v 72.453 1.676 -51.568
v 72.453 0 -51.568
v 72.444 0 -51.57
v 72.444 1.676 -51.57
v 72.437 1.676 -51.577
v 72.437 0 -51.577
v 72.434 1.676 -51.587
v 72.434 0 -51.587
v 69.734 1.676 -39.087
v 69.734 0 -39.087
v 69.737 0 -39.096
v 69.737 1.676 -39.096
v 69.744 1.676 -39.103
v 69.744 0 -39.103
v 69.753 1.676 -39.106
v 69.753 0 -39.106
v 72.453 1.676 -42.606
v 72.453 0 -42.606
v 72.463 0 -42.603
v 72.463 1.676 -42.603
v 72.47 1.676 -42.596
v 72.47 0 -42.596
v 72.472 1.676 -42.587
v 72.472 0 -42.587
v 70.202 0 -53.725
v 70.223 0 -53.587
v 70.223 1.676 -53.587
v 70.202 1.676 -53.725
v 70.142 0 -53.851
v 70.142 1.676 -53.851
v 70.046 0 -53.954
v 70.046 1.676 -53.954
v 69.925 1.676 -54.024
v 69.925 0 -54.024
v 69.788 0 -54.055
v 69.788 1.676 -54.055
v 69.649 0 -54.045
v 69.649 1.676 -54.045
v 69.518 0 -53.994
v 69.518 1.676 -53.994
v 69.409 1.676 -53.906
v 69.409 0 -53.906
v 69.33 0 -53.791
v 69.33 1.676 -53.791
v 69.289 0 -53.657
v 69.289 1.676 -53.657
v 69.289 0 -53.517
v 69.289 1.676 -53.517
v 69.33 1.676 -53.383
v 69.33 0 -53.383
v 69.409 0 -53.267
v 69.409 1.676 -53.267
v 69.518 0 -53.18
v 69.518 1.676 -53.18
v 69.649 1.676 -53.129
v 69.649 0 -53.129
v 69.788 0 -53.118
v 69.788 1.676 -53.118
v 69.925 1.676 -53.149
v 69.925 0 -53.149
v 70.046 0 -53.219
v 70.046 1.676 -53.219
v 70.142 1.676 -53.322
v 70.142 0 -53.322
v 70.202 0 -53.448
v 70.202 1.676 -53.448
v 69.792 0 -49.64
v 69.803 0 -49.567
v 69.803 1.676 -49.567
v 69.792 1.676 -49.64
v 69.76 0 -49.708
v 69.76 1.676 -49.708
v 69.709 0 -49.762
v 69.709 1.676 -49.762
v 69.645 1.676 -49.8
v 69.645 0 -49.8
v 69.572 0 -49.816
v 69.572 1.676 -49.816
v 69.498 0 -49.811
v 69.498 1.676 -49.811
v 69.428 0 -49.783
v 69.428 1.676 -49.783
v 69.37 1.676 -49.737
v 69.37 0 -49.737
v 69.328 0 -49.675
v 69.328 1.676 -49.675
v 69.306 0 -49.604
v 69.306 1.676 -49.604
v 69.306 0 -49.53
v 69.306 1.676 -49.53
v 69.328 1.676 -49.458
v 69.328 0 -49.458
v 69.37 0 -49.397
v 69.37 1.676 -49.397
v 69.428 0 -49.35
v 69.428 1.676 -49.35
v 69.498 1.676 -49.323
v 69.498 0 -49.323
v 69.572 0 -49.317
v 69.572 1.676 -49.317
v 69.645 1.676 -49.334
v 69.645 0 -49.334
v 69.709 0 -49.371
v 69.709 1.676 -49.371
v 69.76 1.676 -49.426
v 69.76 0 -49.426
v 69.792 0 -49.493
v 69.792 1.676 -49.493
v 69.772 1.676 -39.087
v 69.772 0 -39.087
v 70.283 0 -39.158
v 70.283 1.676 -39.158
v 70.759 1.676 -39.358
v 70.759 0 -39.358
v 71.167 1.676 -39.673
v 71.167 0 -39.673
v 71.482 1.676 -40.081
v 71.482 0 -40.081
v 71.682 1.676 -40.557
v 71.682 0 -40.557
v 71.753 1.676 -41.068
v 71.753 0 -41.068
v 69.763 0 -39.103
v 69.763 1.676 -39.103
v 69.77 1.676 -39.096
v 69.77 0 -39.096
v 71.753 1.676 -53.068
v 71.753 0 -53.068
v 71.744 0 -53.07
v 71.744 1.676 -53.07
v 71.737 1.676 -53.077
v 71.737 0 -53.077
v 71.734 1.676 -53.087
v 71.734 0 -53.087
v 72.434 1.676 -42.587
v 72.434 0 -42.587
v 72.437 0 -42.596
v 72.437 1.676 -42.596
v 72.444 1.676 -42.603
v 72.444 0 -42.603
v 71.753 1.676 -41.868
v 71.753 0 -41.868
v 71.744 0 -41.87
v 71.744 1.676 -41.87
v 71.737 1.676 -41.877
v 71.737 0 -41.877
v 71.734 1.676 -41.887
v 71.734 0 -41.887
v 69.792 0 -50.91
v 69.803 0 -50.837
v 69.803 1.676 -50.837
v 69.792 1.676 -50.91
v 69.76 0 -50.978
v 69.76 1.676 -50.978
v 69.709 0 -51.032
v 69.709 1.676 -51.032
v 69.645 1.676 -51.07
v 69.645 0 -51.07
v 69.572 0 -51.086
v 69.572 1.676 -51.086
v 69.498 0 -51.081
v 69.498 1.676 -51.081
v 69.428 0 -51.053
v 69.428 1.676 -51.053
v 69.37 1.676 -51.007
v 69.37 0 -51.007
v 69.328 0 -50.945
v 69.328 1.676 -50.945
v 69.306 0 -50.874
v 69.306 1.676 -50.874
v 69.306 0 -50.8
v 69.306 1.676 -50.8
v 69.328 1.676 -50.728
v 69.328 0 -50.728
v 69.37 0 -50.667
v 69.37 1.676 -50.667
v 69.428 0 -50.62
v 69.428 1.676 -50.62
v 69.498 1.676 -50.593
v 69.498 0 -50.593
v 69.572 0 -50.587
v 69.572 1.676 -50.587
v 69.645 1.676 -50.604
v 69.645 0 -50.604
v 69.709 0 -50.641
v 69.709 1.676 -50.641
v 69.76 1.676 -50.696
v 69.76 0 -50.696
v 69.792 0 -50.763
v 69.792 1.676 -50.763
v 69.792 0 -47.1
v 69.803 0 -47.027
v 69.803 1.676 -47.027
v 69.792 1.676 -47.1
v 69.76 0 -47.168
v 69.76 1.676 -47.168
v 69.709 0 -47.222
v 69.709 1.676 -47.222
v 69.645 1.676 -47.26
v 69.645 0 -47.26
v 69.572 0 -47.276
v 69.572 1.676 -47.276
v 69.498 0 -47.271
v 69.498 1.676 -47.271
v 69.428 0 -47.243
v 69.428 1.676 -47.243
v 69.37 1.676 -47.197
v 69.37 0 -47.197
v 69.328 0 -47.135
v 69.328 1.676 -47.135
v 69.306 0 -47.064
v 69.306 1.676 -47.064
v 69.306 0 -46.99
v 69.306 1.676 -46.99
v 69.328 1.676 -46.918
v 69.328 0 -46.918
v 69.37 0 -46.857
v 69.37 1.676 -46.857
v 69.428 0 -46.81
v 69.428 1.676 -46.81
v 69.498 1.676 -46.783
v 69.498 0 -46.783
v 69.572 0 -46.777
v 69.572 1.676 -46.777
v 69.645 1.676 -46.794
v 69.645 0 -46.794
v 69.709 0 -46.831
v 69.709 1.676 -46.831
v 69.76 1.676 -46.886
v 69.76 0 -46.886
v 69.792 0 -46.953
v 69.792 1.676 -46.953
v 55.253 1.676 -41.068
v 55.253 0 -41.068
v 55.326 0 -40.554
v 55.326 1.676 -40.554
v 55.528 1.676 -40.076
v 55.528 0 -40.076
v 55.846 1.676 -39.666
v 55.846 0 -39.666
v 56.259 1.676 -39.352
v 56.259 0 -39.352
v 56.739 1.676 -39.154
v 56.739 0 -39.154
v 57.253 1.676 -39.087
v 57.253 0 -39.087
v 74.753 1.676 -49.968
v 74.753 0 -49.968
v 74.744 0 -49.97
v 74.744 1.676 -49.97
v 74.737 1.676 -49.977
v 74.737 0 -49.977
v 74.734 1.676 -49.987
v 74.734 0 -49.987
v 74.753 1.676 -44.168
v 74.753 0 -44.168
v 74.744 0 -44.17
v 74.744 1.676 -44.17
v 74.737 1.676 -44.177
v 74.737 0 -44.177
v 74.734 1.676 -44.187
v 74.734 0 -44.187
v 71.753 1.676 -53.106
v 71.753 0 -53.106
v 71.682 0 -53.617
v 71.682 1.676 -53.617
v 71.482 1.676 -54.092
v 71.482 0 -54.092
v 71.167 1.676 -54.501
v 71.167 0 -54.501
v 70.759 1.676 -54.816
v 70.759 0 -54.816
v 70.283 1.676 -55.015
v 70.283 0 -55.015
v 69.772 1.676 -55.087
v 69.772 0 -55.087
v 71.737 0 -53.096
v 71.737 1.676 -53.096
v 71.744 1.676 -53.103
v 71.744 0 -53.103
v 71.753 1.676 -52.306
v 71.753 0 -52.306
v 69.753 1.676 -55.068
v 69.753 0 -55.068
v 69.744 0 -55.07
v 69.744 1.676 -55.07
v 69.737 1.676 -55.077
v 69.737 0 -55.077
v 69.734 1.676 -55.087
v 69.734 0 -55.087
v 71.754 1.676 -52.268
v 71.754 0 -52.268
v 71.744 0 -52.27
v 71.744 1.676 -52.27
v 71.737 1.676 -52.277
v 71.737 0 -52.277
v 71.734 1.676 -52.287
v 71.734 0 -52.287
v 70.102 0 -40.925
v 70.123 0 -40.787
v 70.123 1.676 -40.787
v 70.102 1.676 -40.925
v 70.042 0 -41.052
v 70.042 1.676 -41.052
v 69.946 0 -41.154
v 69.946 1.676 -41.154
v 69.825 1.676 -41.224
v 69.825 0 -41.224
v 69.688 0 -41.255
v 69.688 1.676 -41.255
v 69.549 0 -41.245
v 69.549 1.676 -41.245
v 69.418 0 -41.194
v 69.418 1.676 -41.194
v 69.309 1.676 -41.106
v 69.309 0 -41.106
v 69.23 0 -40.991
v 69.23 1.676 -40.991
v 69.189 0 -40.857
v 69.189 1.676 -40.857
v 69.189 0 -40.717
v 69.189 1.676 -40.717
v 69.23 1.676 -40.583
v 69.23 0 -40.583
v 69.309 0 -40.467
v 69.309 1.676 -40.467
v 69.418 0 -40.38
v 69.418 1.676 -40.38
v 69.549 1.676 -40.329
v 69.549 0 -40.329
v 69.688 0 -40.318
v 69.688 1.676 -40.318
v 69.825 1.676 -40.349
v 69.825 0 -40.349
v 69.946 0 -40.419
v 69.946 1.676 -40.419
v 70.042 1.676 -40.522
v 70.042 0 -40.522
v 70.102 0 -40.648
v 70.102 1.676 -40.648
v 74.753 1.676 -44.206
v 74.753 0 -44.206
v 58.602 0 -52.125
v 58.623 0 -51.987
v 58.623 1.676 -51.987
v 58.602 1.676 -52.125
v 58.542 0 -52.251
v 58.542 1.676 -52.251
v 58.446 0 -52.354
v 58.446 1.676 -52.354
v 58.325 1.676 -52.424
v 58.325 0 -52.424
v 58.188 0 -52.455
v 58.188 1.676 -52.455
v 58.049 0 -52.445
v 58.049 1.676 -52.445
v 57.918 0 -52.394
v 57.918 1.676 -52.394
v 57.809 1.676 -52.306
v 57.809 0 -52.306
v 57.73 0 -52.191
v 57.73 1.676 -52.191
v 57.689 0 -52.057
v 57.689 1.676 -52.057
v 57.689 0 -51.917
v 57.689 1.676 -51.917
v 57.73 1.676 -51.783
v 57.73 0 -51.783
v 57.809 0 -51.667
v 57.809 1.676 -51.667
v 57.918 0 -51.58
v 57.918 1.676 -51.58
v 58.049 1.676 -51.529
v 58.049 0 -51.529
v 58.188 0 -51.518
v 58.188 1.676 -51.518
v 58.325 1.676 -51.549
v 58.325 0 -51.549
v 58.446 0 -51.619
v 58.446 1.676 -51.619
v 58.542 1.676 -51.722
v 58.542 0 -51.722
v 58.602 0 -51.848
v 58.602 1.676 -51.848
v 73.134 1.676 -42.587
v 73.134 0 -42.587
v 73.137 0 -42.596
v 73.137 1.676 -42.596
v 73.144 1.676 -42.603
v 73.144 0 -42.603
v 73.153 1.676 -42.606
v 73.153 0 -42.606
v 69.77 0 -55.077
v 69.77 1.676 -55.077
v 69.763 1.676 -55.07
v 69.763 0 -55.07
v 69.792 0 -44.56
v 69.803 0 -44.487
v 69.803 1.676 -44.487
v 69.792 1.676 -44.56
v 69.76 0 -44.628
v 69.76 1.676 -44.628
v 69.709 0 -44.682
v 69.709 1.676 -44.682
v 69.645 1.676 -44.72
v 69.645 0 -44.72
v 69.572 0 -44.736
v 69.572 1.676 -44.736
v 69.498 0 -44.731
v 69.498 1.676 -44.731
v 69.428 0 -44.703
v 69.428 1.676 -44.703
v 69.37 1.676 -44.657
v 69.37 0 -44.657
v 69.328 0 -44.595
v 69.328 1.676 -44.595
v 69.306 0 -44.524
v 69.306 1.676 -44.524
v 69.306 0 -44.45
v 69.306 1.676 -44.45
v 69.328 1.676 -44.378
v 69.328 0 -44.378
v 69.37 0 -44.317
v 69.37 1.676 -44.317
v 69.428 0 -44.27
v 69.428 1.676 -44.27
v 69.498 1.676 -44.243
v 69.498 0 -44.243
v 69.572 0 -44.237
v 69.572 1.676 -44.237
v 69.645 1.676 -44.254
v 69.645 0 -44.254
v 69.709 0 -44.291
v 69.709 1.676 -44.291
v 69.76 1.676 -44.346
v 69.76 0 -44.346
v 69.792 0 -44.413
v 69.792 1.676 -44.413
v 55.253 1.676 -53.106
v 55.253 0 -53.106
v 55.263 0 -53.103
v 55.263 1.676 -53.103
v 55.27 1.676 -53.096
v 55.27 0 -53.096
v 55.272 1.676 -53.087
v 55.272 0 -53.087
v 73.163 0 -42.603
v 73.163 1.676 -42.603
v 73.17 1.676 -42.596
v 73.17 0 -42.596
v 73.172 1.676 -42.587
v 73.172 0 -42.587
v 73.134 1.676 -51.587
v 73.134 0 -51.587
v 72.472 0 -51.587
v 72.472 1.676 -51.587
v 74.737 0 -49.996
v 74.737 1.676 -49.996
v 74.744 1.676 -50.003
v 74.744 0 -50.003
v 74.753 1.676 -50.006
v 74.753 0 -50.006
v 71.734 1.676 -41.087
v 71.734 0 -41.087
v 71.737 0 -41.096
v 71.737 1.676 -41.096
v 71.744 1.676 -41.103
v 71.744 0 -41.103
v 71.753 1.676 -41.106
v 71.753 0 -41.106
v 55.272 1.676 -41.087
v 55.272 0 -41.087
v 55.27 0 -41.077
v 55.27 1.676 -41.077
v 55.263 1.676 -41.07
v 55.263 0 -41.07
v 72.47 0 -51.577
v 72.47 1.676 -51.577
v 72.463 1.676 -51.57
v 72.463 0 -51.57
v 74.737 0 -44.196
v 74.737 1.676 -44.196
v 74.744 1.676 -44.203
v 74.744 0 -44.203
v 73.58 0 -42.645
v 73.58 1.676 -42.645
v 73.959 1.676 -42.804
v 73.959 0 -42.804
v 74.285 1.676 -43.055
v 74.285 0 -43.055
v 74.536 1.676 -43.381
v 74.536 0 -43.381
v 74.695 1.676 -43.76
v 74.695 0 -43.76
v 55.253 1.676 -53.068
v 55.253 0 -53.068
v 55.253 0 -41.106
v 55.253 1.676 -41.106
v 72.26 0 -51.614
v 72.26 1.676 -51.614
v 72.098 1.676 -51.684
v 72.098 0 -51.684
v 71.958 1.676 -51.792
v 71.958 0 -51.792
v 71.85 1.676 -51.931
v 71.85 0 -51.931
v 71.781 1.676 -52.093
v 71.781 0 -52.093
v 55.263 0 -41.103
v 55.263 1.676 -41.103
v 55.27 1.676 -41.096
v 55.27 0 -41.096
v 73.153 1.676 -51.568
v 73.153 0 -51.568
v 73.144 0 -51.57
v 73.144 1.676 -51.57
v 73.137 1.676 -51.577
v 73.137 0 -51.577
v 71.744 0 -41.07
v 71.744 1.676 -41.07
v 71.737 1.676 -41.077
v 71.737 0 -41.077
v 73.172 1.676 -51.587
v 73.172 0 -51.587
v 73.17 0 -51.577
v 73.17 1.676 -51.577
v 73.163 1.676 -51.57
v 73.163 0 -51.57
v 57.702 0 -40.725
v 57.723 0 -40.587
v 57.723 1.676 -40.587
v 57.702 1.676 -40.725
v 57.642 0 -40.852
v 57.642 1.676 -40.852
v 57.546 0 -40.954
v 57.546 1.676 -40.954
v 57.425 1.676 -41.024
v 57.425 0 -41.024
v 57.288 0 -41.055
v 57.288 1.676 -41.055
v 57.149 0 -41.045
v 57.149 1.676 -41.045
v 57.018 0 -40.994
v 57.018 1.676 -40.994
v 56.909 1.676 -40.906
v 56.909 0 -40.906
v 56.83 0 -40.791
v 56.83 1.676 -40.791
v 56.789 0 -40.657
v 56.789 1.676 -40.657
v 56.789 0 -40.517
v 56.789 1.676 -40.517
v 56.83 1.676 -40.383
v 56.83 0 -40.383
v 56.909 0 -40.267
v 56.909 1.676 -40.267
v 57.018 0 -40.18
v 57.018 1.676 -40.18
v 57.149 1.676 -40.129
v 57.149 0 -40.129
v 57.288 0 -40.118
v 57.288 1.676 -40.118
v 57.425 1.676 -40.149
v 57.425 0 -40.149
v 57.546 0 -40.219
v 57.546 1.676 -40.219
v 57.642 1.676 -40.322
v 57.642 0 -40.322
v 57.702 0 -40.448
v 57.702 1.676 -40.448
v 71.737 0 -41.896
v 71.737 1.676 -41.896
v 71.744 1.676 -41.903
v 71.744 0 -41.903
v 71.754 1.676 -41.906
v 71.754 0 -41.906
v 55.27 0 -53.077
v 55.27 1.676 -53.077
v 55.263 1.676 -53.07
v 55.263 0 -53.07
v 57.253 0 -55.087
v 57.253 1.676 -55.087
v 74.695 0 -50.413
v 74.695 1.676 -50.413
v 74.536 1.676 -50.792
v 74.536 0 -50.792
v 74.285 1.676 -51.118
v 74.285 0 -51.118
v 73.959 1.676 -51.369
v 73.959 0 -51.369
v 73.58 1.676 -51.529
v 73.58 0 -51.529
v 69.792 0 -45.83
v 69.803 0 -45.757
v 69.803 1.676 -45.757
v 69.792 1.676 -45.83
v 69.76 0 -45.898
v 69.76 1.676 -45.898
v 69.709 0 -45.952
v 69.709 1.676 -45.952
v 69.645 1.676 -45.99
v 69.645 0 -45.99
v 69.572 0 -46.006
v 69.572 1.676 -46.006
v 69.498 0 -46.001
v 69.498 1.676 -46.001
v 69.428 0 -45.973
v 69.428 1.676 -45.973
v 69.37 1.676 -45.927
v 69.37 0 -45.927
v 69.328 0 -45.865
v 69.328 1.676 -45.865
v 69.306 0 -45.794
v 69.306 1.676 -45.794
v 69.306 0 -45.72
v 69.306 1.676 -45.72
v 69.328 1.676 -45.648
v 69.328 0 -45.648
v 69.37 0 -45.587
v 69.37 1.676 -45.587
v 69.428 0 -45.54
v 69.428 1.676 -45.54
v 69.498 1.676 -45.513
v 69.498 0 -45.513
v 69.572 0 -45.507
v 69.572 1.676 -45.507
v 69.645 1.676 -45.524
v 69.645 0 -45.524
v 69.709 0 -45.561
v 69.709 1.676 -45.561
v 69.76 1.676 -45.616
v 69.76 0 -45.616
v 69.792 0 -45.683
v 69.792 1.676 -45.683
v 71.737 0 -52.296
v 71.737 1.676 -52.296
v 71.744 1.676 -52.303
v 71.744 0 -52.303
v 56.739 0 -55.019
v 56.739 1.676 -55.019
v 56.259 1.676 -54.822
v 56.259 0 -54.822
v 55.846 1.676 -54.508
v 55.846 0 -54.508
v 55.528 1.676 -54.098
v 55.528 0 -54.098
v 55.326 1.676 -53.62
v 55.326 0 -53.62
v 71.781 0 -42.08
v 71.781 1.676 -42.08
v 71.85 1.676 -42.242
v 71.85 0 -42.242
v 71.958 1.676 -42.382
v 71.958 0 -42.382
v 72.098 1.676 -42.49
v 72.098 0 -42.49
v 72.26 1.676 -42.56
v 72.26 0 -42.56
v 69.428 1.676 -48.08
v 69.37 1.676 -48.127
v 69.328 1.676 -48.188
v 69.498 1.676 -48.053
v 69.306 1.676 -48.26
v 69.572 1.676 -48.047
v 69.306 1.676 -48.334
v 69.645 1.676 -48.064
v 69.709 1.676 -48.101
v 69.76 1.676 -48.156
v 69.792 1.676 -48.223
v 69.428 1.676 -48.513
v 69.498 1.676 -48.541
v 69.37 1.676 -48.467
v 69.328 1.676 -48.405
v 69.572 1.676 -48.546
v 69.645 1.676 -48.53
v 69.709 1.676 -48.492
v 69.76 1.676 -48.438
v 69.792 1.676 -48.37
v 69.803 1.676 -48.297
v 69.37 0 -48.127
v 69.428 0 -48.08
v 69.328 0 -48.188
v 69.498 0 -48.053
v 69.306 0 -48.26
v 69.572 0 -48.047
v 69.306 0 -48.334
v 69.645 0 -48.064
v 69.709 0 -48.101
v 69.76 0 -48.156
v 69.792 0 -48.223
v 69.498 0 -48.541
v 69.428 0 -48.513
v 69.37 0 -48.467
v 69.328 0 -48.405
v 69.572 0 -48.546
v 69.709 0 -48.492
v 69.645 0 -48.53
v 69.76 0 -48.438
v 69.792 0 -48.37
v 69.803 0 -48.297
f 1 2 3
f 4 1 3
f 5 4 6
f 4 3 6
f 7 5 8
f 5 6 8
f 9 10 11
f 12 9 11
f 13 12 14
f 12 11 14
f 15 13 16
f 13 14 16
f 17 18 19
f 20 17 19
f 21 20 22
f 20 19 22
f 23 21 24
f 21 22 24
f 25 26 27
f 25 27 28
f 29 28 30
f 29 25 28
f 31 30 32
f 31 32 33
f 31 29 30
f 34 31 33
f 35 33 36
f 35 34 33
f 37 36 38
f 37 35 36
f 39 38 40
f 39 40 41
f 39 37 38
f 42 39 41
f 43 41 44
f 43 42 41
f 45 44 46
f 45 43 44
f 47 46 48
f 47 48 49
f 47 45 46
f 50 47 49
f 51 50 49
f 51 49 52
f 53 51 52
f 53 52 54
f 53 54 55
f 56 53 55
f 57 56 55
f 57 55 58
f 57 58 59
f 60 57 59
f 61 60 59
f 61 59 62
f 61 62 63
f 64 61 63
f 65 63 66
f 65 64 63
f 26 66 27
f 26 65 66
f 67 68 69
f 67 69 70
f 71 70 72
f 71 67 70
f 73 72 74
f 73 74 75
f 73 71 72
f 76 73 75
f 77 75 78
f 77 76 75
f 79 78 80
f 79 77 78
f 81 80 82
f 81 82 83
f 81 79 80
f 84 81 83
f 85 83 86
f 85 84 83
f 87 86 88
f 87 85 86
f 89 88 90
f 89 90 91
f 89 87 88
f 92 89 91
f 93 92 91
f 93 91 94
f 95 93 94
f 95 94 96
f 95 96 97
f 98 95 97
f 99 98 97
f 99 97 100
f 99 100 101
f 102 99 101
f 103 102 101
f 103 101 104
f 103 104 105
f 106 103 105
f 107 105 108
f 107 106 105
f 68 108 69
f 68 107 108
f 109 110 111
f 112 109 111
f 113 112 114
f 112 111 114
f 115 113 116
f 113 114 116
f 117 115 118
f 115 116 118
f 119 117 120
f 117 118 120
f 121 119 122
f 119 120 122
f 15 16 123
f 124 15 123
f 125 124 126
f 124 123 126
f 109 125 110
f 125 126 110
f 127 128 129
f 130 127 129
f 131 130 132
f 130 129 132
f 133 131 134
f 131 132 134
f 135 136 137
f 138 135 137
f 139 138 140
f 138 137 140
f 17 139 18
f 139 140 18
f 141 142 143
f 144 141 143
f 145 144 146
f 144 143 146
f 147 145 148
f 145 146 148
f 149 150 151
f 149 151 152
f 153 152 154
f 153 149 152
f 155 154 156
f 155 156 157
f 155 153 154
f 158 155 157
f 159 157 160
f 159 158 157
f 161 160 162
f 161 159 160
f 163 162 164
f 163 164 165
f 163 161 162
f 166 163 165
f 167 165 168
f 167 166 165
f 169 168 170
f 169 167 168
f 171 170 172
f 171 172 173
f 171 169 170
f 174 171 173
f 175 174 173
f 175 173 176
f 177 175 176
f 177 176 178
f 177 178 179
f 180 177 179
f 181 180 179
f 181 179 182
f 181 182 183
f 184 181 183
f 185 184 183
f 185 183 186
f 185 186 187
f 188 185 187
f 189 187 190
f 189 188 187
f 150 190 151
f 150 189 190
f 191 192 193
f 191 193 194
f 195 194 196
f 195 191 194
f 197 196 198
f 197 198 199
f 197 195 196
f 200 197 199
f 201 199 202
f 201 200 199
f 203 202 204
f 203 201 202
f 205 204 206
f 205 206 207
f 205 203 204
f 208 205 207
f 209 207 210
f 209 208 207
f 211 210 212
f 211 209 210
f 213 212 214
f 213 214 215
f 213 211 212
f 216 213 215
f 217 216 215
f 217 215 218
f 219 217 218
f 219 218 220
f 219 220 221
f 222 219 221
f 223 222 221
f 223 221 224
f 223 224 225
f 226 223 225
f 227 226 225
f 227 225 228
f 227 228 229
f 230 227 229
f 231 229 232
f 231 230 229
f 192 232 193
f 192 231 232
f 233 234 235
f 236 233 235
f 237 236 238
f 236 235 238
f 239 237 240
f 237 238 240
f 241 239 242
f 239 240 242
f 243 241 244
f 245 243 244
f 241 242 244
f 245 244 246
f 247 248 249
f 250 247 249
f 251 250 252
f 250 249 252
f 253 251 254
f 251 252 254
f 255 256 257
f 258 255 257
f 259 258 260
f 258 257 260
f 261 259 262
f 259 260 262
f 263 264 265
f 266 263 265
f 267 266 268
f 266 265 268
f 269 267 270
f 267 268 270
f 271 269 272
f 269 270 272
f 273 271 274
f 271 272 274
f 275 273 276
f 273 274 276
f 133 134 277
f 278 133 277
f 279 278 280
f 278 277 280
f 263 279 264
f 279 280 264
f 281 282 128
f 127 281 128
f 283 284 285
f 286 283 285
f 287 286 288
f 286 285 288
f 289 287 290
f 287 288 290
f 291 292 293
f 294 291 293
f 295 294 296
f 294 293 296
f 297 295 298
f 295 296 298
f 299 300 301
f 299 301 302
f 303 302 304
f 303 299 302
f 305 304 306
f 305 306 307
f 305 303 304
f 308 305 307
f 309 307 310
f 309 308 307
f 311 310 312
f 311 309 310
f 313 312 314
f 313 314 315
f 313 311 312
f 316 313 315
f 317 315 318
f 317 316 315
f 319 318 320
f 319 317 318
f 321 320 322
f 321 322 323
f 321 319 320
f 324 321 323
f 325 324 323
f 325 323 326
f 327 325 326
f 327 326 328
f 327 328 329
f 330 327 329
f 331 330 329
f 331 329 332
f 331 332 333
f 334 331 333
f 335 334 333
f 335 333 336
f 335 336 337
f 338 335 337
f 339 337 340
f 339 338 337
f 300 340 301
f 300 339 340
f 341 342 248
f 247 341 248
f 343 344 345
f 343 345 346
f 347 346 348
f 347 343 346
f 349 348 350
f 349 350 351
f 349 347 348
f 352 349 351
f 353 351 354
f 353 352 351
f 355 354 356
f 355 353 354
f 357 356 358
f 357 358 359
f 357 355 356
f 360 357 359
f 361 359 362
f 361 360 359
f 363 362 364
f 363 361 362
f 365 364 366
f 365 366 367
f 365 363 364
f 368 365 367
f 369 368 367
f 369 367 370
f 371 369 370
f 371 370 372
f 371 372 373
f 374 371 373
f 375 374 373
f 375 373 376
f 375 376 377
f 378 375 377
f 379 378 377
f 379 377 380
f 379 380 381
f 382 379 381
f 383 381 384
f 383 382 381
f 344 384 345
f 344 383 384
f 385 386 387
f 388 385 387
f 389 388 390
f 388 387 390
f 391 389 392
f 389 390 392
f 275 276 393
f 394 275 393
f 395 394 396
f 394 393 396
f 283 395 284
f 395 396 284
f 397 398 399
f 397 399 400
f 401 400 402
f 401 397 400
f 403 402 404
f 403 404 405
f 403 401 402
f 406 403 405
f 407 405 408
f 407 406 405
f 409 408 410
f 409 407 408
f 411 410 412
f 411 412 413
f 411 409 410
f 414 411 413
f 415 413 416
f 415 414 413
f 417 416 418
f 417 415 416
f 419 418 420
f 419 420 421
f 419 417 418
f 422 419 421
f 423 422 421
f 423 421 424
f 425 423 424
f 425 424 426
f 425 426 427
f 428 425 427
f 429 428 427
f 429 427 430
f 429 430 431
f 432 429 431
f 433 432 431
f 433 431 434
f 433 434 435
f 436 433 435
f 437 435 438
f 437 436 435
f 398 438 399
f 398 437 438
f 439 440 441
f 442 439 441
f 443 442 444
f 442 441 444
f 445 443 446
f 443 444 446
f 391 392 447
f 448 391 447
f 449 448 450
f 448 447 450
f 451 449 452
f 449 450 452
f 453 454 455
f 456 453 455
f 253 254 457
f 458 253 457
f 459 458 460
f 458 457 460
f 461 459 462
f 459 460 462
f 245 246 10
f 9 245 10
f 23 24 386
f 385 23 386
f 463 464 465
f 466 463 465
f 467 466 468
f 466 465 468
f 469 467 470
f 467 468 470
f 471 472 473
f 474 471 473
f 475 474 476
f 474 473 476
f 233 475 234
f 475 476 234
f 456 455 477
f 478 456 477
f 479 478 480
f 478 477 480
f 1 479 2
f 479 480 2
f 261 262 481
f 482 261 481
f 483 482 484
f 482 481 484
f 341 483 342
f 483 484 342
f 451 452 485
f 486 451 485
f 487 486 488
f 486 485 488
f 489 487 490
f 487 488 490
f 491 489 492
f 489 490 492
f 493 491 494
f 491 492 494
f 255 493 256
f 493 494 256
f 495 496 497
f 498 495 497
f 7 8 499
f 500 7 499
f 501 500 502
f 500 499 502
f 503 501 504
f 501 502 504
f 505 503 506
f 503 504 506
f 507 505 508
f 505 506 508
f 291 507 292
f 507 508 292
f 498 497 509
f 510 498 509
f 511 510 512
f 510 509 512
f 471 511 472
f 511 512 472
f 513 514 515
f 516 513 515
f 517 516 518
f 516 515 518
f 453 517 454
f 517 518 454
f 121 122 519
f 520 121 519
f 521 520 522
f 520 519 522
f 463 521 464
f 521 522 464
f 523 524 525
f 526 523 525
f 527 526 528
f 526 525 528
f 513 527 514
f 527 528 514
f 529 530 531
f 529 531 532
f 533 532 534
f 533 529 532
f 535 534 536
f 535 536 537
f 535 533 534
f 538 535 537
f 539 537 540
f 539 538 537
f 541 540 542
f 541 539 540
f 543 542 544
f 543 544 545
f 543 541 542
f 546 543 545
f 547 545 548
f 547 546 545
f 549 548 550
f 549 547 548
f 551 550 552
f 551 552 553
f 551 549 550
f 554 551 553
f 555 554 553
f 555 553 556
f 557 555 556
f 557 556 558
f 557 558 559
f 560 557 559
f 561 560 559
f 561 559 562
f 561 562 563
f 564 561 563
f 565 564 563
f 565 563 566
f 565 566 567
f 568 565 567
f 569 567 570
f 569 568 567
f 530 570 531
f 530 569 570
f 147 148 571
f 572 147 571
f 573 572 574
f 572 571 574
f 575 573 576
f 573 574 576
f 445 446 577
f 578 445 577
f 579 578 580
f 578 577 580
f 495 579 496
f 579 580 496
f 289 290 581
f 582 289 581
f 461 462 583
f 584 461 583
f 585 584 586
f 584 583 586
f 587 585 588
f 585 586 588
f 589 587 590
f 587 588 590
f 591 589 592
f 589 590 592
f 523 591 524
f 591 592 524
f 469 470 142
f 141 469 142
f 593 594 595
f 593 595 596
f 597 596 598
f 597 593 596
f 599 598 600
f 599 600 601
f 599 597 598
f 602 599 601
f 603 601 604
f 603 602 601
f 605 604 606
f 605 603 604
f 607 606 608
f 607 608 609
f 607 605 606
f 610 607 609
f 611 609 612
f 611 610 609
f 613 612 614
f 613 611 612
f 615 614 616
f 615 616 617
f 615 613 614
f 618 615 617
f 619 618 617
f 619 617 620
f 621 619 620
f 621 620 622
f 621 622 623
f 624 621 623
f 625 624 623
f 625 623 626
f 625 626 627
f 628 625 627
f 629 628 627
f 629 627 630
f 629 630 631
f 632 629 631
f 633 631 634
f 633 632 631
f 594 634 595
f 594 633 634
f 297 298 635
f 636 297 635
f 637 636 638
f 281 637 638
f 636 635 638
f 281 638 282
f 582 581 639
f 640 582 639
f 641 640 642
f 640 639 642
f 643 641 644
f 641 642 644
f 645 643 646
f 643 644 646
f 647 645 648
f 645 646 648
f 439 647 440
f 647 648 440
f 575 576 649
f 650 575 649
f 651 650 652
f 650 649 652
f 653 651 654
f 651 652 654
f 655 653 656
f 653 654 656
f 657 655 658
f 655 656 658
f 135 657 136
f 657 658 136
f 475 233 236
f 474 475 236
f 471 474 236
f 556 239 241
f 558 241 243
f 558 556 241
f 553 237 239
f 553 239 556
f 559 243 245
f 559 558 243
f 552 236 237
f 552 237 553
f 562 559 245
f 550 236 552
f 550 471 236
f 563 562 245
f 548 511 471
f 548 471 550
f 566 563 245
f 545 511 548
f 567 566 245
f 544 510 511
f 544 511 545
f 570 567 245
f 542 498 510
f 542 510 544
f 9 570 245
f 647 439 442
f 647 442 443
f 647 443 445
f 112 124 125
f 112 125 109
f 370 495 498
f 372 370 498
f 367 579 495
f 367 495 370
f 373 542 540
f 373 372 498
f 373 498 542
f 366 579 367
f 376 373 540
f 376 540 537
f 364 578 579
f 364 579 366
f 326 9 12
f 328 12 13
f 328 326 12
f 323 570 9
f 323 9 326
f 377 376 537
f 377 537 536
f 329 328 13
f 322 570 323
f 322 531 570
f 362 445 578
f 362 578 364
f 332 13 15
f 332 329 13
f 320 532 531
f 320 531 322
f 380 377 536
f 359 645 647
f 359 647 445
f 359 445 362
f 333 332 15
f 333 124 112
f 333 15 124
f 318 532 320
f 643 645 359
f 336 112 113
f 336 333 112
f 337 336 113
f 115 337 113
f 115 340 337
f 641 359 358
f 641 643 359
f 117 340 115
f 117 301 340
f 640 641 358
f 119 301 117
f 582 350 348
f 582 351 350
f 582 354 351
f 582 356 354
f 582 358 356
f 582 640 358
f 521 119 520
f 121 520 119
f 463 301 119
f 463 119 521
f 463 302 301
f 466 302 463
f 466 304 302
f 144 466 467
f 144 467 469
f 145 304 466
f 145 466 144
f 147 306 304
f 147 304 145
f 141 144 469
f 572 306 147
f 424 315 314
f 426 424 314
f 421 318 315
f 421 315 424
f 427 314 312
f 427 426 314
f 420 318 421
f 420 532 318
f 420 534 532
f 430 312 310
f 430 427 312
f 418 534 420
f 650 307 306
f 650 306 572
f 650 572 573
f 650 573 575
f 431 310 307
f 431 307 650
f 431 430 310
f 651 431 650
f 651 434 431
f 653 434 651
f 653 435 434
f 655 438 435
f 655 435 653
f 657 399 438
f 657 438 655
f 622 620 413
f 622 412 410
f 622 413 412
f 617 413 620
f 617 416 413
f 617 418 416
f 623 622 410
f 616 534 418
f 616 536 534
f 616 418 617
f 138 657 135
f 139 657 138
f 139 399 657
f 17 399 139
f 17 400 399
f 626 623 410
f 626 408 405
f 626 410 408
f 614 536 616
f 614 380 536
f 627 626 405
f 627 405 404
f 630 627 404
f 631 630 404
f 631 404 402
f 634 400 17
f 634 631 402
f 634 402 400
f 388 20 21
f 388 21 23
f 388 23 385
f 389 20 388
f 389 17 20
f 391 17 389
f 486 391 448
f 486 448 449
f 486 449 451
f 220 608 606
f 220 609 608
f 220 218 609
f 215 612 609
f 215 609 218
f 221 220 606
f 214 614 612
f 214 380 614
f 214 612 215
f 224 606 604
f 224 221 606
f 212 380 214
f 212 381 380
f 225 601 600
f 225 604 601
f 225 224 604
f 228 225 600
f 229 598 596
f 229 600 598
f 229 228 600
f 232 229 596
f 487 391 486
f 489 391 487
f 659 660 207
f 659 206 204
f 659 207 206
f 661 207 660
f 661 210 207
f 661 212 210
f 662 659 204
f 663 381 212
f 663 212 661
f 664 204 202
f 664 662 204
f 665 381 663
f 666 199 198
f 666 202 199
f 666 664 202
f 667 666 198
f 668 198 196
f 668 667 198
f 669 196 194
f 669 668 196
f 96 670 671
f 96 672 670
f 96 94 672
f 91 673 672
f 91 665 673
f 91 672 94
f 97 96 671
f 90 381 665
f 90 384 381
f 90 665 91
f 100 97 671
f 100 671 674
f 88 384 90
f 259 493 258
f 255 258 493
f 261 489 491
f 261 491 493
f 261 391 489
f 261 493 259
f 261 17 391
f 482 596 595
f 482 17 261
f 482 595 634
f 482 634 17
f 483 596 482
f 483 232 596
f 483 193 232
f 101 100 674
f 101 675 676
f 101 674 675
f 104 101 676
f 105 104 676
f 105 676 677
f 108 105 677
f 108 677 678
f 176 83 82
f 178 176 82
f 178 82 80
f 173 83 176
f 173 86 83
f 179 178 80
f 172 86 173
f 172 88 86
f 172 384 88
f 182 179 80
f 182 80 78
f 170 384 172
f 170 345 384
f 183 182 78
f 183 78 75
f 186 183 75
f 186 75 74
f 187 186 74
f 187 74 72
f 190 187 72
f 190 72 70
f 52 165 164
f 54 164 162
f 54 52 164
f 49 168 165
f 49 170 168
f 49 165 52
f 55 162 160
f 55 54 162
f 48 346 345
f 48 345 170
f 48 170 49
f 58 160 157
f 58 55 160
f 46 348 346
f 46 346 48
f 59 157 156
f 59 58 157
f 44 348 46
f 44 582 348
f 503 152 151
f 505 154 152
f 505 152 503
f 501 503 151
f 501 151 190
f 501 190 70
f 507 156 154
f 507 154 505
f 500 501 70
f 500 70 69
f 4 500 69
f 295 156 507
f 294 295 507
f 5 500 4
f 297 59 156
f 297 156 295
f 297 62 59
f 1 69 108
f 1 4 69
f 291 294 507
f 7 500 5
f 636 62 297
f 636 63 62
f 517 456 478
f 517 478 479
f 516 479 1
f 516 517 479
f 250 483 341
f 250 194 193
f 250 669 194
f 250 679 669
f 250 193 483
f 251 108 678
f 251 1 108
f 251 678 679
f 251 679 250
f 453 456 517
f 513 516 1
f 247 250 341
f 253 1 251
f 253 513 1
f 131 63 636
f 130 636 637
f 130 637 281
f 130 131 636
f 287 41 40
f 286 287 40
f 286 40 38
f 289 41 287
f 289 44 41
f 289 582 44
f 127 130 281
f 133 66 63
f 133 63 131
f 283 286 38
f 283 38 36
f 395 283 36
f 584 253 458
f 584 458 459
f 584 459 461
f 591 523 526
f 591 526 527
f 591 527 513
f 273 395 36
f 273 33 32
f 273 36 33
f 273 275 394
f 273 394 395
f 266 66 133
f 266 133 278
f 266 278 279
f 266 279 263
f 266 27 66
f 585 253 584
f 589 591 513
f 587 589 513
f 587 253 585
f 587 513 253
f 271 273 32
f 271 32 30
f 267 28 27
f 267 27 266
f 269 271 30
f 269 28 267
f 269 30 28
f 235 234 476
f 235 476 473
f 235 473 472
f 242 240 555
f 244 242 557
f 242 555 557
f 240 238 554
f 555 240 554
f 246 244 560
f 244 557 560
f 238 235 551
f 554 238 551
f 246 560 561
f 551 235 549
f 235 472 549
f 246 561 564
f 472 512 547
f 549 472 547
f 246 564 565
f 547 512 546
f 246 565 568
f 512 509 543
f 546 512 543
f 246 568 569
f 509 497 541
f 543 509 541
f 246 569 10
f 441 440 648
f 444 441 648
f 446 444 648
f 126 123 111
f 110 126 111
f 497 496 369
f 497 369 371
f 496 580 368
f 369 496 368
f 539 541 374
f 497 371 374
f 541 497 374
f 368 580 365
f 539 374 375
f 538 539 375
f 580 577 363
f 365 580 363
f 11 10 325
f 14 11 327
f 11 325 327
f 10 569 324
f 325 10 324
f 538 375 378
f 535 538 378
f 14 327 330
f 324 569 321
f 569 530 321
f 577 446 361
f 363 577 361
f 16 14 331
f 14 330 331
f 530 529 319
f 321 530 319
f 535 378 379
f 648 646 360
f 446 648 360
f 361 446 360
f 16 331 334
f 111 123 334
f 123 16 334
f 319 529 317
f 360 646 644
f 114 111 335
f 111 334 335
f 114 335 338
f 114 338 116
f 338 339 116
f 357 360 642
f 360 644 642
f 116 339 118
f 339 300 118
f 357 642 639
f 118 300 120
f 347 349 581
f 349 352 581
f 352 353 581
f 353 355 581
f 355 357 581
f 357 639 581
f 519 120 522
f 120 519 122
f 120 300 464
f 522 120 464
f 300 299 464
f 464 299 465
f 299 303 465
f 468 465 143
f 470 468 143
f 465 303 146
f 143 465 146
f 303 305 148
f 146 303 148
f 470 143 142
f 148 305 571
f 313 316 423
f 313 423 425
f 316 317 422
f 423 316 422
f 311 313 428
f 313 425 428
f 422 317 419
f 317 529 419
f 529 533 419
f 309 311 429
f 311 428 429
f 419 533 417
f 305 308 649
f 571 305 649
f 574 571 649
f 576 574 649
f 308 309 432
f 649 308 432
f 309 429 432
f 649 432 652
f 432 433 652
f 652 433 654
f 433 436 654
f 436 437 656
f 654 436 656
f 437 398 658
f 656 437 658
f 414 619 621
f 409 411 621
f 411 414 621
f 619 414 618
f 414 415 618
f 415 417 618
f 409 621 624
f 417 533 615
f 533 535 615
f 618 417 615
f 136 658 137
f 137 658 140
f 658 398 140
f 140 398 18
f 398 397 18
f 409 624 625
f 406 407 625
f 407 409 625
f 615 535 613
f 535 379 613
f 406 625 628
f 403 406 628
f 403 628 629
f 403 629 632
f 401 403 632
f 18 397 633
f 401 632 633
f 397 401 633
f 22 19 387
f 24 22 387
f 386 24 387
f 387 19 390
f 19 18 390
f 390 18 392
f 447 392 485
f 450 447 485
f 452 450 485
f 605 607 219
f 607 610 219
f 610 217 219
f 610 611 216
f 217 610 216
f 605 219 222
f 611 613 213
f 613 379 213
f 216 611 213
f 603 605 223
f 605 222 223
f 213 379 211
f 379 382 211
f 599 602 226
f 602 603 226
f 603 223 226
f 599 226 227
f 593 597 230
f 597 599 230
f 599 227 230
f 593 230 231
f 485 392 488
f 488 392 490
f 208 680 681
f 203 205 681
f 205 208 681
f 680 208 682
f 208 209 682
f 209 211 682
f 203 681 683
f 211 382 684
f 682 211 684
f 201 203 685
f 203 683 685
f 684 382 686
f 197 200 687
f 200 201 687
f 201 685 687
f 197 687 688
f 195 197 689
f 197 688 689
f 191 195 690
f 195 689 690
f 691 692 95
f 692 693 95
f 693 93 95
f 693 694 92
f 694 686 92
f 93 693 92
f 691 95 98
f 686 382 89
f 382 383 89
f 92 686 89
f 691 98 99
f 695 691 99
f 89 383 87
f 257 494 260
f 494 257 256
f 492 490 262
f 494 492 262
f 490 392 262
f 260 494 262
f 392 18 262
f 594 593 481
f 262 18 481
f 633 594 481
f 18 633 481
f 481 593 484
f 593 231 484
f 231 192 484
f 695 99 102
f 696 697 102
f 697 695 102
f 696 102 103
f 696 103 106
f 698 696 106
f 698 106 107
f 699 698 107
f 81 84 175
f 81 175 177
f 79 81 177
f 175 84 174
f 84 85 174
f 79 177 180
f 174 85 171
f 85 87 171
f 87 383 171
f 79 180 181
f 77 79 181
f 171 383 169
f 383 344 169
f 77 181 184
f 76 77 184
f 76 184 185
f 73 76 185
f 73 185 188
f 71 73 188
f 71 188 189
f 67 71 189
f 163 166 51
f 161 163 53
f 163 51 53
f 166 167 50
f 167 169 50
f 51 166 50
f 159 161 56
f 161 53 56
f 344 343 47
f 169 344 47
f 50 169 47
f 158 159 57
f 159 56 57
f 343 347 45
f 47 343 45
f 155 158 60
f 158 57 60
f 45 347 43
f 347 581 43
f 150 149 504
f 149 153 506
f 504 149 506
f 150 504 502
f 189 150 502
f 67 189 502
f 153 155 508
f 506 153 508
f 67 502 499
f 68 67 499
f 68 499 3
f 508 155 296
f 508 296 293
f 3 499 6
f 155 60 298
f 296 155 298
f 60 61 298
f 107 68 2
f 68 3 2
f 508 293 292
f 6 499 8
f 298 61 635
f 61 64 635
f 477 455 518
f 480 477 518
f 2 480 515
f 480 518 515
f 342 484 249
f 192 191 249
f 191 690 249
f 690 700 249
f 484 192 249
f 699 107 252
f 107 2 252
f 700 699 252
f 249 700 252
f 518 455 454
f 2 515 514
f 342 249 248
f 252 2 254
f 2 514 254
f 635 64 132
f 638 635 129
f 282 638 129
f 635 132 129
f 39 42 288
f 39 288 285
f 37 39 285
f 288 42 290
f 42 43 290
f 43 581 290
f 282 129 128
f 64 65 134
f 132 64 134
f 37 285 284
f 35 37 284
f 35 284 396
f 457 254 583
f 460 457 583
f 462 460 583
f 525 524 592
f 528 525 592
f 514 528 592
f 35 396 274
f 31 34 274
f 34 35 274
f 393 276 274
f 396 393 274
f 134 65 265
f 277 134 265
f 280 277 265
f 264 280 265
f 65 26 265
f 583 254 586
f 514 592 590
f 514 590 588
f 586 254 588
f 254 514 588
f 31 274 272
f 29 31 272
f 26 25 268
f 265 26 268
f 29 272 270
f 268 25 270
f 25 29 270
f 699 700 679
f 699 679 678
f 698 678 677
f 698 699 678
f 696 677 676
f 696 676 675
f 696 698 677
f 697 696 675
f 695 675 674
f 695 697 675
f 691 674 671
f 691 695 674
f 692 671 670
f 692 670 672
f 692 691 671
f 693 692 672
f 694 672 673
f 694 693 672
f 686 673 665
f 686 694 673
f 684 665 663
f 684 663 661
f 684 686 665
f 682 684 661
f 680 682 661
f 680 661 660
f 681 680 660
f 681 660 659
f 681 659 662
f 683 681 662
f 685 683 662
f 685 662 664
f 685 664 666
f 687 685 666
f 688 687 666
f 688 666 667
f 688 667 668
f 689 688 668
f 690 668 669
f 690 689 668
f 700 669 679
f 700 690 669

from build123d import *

# Parameters (mm, degrees)
SKETCH1_R           = 0.46989906
SKETCH1_R_2         = 0.2499995
BOSS_EXTRUDE1_DEPTH = 1.6764


with BuildPart() as part:
    # Sketch1 → Boss-Extrude1 (new body)
    with BuildSketch(Plane(origin=(0, 0, 0), x_dir=(1, 0, 0), z_dir=(0, 1, 0))):
        with BuildLine():
            Line((73.134188992, 51.586783601), (72.472390316, 51.586783601))
            ThreePointArc((72.472390316, 51.586783601), (72.466796066, 51.573277888), (72.453290354, 51.567683639))
            ThreePointArc((72.453290354, 51.567683639), (72.439692672, 51.573370488), (72.434192176, 51.587044615))
            ThreePointArc((72.434192176, 51.587044615), (71.958321344, 51.791813191), (71.753552768, 52.267684022))
            ThreePointArc((71.753552768, 52.267684022), (71.739878641, 52.273184519), (71.734191792, 52.286782201))
            ThreePointArc((71.734191792, 52.286782201), (71.739786041, 52.300287913), (71.753291754, 52.305882163))
            Line((71.753291754, 52.305882163), (71.753291754, 53.067680639))
            ThreePointArc((71.753291754, 53.067680639), (71.739786041, 53.073274888), (71.734191792, 53.086780601))
            ThreePointArc((71.734191792, 53.086780601), (71.73975368, 53.100253874), (71.753200111, 53.105880343))
            ThreePointArc((71.753200111, 53.105880343), (71.167492925, 54.500977772), (69.772395496, 55.086684958))
            ThreePointArc((69.772395496, 55.086684958), (69.766769027, 55.073238527), (69.753295754, 55.067676639))
            ThreePointArc((69.753295754, 55.067676639), (69.739790041, 55.073270888), (69.734195792, 55.086776601))
            Line((69.734195792, 55.086776601), (57.253320754, 55.086776601))
            ThreePointArc((57.253320754, 55.086776601), (55.845892561, 54.507714506), (55.253416396, 53.105880343))
            ThreePointArc((55.253416396, 53.105880343), (55.266862828, 53.100253874), (55.272424716, 53.086780601))
            ThreePointArc((55.272424716, 53.086780601), (55.266830466, 53.073274888), (55.253324754, 53.067680639))
            Line((55.253324754, 53.067680639), (55.253324754, 41.105904563))
            ThreePointArc((55.253324754, 41.105904563), (55.266830466, 41.100310313), (55.272424716, 41.086804601))
            ThreePointArc((55.272424716, 41.086804601), (55.266862828, 41.073331328), (55.253416396, 41.067704859))
            ThreePointArc((55.253416396, 41.067704859), (55.845892561, 39.665870695), (57.253320754, 39.086808601))
            Line((57.253320754, 39.086808601), (69.734195792, 39.086808601))
            ThreePointArc((69.734195792, 39.086808601), (69.739790041, 39.100314313), (69.753295754, 39.105908563))
            ThreePointArc((69.753295754, 39.105908563), (69.766769027, 39.100346675), (69.772395496, 39.086900243))
            ThreePointArc((69.772395496, 39.086900243), (71.167492925, 39.672607429), (71.753200111, 41.067704859))
            ThreePointArc((71.753200111, 41.067704859), (71.73975368, 41.073331328), (71.734191792, 41.086804601))
            ThreePointArc((71.734191792, 41.086804601), (71.739786041, 41.100310313), (71.753291754, 41.105904563))
            Line((71.753291754, 41.105904563), (71.753291754, 41.867703039))
            ThreePointArc((71.753291754, 41.867703039), (71.739786041, 41.873297288), (71.734191792, 41.886803001))
            ThreePointArc((71.734191792, 41.886803001), (71.739878641, 41.900400683), (71.753552768, 41.905901179))
            ThreePointArc((71.753552768, 41.905901179), (71.958321344, 42.381772011), (72.434192176, 42.586540587))
            ThreePointArc((72.434192176, 42.586540587), (72.439692672, 42.600214713), (72.453290354, 42.605901563))
            ThreePointArc((72.453290354, 42.605901563), (72.466796066, 42.600307313), (72.472390316, 42.586801601))
            Line((72.472390316, 42.586801601), (73.134188992, 42.586801601))
            ThreePointArc((73.134188992, 42.586801601), (73.139783241, 42.600307313), (73.153288954, 42.605901563))
            ThreePointArc((73.153288954, 42.605901563), (73.166754144, 42.600347714), (73.172388573, 42.586916043))
            ThreePointArc((73.172388573, 42.586916043), (74.284646691, 43.055440663), (74.753171311, 44.167698782))
            ThreePointArc((74.753171311, 44.167698782), (74.73973964, 44.173333211), (74.734185792, 44.186798401))
            ThreePointArc((74.734185792, 44.186798401), (74.739780041, 44.200304113), (74.753285754, 44.205898363))
            Line((74.753285754, 44.205898363), (74.753285754, 49.967686839))
            ThreePointArc((74.753285754, 49.967686839), (74.739780041, 49.973281088), (74.734185792, 49.986786801))
            ThreePointArc((74.734185792, 49.986786801), (74.73973964, 50.000251991), (74.753171311, 50.00588642))
            ThreePointArc((74.753171311, 50.00588642), (74.284646691, 51.118144538), (73.172388573, 51.586669158))
            ThreePointArc((73.172388573, 51.586669158), (73.166754144, 51.573237487), (73.153288954, 51.567683639))
            ThreePointArc((73.153288954, 51.567683639), (73.139783241, 51.573277888), (73.134188992, 51.586783601))
        make_face()
        with Locations((57.253320754, 40.586805601)):
            Circle(SKETCH1_R, mode=Mode.SUBTRACT)
        with Locations((69.653295954, 40.786805201)):
            Circle(SKETCH1_R, mode=Mode.SUBTRACT)
        with Locations((69.553296154, 44.486797801)):
            Circle(SKETCH1_R_2, mode=Mode.SUBTRACT)
        with Locations((69.553296154, 45.756795261)):
            Circle(SKETCH1_R_2, mode=Mode.SUBTRACT)
        with Locations((69.553296154, 47.026792721)):
            Circle(SKETCH1_R_2, mode=Mode.SUBTRACT)
        with Locations((58.153318954, 51.986782801)):
            Circle(SKETCH1_R, mode=Mode.SUBTRACT)
        with Locations((69.553296154, 48.296790181)):
            Circle(SKETCH1_R_2, mode=Mode.SUBTRACT)
        with Locations((69.553296154, 49.566787641)):
            Circle(SKETCH1_R_2, mode=Mode.SUBTRACT)
        with Locations((69.553296154, 50.836785101)):
            Circle(SKETCH1_R_2, mode=Mode.SUBTRACT)
        with Locations((69.753295754, 53.586779601)):
            Circle(SKETCH1_R, mode=Mode.SUBTRACT)
    extrude(amount=BOSS_EXTRUDE1_DEPTH)


solid = part.part
